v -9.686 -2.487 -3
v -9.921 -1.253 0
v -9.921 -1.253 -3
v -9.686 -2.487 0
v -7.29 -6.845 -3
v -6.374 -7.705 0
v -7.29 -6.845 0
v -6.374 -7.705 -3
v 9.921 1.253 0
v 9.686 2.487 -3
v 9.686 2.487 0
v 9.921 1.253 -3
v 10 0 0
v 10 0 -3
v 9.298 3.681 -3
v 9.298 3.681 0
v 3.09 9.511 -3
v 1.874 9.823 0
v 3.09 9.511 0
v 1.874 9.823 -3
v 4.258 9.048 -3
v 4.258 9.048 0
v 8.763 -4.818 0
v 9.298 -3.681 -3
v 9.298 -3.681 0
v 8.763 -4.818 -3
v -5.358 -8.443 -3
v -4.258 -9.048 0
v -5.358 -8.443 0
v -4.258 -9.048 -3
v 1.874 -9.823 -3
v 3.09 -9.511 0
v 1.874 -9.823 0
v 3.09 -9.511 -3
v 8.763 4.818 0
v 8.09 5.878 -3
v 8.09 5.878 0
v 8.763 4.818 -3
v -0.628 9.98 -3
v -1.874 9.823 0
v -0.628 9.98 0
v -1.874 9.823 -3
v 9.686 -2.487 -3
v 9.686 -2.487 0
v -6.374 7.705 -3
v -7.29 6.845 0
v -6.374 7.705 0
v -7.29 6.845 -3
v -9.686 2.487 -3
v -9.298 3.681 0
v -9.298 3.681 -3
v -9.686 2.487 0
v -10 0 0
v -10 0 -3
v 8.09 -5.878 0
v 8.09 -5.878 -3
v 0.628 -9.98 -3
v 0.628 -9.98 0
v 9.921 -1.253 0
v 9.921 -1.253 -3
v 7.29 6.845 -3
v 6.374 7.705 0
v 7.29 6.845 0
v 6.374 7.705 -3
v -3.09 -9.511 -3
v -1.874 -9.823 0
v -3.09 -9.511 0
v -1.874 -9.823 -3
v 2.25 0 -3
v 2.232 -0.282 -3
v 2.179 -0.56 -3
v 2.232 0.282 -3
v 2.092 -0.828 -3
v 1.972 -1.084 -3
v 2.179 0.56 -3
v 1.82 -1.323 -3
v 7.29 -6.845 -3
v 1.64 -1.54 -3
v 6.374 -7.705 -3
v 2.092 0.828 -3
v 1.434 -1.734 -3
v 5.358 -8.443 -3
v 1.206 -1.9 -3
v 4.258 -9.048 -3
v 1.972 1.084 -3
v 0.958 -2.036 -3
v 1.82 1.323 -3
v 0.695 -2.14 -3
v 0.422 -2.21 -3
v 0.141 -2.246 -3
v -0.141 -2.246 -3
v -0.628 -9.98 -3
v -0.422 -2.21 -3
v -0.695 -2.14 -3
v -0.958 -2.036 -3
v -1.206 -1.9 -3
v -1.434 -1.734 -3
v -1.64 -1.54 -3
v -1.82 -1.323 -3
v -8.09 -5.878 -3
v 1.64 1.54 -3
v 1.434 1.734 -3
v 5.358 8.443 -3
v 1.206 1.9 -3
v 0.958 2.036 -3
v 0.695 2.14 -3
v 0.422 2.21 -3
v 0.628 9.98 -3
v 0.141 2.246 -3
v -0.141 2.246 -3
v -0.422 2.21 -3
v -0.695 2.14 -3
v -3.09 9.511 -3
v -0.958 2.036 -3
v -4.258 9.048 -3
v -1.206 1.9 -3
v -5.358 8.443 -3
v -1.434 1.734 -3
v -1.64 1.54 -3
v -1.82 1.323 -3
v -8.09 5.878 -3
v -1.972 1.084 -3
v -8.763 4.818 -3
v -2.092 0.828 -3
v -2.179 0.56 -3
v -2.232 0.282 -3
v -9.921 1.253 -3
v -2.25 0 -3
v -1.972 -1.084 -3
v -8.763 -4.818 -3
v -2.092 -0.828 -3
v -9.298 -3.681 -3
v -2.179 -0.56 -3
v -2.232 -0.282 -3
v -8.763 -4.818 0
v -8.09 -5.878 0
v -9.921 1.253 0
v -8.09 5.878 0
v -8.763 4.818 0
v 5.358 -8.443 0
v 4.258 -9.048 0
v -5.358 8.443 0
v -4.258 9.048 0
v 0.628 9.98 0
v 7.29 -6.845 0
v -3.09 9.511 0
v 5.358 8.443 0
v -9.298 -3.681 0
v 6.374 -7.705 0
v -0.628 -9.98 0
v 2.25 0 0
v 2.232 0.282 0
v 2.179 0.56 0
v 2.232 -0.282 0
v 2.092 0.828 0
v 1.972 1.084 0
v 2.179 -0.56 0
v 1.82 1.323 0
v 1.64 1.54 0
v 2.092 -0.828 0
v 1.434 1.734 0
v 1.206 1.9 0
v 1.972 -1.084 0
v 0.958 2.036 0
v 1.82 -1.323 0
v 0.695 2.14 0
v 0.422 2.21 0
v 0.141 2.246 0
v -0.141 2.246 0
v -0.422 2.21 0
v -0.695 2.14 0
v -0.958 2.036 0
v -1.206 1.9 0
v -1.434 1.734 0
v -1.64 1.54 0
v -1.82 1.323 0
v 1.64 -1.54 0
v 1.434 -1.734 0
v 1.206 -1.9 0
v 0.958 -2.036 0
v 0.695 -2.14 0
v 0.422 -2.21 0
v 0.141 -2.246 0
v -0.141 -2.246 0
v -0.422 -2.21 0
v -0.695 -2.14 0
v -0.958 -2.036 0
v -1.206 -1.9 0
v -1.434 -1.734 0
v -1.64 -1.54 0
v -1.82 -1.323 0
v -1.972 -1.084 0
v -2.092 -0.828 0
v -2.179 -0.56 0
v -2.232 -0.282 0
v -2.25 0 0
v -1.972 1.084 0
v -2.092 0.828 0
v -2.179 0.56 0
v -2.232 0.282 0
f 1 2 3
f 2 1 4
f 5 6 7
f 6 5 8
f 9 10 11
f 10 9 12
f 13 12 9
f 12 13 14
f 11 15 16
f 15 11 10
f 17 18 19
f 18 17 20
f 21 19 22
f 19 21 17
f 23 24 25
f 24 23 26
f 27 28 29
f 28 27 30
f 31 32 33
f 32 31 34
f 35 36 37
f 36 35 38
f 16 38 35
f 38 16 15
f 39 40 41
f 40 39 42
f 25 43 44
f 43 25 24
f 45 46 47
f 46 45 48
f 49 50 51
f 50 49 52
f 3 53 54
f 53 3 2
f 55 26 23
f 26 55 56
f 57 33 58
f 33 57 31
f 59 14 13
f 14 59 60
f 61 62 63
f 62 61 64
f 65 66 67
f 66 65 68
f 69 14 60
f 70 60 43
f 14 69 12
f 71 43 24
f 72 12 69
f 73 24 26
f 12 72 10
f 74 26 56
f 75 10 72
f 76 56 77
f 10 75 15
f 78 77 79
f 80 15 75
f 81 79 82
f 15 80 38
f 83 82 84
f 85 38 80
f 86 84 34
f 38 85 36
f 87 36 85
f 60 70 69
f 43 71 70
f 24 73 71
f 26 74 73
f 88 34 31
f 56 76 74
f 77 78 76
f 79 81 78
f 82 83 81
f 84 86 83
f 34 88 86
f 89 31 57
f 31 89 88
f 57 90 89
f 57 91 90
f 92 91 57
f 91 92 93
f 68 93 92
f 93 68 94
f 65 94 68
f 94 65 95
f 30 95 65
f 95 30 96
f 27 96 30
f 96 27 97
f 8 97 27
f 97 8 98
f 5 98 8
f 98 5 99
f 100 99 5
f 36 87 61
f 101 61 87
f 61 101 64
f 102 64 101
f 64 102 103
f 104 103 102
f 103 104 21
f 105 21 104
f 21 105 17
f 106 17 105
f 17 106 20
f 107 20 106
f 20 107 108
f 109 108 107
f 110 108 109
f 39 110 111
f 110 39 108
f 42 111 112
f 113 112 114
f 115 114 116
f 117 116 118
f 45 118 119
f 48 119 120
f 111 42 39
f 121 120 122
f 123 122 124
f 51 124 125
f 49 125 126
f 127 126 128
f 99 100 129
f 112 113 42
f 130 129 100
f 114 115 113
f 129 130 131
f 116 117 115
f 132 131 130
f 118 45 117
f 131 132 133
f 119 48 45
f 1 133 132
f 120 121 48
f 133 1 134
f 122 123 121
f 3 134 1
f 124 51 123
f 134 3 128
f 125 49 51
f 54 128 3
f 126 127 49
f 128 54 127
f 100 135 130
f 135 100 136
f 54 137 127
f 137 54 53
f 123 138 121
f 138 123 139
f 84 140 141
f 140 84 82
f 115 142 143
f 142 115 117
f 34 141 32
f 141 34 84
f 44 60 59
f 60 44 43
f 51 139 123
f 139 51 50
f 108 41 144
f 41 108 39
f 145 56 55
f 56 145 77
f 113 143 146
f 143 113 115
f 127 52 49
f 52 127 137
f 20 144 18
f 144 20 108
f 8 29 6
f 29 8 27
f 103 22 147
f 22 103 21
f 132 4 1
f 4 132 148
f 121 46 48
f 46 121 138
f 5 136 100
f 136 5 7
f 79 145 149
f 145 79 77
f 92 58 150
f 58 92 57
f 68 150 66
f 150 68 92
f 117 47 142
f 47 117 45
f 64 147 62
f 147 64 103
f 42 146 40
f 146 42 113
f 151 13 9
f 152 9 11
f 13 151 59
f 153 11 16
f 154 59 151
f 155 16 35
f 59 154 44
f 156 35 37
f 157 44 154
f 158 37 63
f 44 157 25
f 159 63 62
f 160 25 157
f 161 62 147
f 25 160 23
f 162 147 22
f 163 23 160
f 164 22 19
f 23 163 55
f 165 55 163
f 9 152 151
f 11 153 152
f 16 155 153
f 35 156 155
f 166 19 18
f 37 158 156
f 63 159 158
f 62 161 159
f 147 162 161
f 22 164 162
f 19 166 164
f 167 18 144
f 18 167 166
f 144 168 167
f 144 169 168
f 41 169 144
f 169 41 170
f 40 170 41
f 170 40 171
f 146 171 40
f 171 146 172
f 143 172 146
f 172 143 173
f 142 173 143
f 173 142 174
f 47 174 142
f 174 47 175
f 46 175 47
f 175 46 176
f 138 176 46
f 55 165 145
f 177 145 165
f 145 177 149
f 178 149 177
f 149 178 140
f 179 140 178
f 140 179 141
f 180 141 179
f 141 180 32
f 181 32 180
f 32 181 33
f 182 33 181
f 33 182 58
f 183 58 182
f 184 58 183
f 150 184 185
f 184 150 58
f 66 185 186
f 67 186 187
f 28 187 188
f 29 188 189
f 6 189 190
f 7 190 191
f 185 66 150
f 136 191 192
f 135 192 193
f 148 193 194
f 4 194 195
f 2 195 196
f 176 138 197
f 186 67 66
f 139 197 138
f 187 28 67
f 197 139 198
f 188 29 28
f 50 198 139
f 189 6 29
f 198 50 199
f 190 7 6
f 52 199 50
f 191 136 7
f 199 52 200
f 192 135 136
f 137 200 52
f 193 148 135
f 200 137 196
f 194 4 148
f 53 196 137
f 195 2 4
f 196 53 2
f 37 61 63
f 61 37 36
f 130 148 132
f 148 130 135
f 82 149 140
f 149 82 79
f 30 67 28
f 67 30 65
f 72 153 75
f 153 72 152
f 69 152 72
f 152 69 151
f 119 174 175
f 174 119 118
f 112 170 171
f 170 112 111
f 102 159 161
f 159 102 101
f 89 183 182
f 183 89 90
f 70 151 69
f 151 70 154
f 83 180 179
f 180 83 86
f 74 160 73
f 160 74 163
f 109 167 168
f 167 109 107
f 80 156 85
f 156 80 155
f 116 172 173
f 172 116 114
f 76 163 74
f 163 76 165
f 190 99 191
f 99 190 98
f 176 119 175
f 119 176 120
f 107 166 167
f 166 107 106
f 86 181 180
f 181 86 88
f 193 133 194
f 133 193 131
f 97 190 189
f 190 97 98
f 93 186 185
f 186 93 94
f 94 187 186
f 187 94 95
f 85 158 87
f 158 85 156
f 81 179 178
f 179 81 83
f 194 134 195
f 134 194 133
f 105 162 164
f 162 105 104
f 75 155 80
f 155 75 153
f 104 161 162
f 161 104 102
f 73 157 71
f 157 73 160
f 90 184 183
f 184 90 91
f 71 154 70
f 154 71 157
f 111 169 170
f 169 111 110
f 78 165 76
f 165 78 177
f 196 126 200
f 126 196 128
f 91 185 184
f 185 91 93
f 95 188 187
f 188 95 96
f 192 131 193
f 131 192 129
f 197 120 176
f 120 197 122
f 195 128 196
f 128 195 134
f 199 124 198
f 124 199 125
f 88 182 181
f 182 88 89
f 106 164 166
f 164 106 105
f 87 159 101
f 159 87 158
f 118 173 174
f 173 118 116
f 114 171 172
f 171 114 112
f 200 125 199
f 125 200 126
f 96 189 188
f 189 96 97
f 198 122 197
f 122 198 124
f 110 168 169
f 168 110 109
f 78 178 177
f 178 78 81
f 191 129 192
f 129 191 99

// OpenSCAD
$fn = 50;


difference() {
	union() {
		translate(v = [0, 0, -3.0000000000]) {
			cylinder(h = 3, r = 10.0000000000);
		}
		cylinder(h = 0, r = 16.0000000000);
	}
	union() {
		#translate(v = [0, 0, -3]) {
			cylinder(h = 3, r = 2.2500000000);
		}
	}
}
